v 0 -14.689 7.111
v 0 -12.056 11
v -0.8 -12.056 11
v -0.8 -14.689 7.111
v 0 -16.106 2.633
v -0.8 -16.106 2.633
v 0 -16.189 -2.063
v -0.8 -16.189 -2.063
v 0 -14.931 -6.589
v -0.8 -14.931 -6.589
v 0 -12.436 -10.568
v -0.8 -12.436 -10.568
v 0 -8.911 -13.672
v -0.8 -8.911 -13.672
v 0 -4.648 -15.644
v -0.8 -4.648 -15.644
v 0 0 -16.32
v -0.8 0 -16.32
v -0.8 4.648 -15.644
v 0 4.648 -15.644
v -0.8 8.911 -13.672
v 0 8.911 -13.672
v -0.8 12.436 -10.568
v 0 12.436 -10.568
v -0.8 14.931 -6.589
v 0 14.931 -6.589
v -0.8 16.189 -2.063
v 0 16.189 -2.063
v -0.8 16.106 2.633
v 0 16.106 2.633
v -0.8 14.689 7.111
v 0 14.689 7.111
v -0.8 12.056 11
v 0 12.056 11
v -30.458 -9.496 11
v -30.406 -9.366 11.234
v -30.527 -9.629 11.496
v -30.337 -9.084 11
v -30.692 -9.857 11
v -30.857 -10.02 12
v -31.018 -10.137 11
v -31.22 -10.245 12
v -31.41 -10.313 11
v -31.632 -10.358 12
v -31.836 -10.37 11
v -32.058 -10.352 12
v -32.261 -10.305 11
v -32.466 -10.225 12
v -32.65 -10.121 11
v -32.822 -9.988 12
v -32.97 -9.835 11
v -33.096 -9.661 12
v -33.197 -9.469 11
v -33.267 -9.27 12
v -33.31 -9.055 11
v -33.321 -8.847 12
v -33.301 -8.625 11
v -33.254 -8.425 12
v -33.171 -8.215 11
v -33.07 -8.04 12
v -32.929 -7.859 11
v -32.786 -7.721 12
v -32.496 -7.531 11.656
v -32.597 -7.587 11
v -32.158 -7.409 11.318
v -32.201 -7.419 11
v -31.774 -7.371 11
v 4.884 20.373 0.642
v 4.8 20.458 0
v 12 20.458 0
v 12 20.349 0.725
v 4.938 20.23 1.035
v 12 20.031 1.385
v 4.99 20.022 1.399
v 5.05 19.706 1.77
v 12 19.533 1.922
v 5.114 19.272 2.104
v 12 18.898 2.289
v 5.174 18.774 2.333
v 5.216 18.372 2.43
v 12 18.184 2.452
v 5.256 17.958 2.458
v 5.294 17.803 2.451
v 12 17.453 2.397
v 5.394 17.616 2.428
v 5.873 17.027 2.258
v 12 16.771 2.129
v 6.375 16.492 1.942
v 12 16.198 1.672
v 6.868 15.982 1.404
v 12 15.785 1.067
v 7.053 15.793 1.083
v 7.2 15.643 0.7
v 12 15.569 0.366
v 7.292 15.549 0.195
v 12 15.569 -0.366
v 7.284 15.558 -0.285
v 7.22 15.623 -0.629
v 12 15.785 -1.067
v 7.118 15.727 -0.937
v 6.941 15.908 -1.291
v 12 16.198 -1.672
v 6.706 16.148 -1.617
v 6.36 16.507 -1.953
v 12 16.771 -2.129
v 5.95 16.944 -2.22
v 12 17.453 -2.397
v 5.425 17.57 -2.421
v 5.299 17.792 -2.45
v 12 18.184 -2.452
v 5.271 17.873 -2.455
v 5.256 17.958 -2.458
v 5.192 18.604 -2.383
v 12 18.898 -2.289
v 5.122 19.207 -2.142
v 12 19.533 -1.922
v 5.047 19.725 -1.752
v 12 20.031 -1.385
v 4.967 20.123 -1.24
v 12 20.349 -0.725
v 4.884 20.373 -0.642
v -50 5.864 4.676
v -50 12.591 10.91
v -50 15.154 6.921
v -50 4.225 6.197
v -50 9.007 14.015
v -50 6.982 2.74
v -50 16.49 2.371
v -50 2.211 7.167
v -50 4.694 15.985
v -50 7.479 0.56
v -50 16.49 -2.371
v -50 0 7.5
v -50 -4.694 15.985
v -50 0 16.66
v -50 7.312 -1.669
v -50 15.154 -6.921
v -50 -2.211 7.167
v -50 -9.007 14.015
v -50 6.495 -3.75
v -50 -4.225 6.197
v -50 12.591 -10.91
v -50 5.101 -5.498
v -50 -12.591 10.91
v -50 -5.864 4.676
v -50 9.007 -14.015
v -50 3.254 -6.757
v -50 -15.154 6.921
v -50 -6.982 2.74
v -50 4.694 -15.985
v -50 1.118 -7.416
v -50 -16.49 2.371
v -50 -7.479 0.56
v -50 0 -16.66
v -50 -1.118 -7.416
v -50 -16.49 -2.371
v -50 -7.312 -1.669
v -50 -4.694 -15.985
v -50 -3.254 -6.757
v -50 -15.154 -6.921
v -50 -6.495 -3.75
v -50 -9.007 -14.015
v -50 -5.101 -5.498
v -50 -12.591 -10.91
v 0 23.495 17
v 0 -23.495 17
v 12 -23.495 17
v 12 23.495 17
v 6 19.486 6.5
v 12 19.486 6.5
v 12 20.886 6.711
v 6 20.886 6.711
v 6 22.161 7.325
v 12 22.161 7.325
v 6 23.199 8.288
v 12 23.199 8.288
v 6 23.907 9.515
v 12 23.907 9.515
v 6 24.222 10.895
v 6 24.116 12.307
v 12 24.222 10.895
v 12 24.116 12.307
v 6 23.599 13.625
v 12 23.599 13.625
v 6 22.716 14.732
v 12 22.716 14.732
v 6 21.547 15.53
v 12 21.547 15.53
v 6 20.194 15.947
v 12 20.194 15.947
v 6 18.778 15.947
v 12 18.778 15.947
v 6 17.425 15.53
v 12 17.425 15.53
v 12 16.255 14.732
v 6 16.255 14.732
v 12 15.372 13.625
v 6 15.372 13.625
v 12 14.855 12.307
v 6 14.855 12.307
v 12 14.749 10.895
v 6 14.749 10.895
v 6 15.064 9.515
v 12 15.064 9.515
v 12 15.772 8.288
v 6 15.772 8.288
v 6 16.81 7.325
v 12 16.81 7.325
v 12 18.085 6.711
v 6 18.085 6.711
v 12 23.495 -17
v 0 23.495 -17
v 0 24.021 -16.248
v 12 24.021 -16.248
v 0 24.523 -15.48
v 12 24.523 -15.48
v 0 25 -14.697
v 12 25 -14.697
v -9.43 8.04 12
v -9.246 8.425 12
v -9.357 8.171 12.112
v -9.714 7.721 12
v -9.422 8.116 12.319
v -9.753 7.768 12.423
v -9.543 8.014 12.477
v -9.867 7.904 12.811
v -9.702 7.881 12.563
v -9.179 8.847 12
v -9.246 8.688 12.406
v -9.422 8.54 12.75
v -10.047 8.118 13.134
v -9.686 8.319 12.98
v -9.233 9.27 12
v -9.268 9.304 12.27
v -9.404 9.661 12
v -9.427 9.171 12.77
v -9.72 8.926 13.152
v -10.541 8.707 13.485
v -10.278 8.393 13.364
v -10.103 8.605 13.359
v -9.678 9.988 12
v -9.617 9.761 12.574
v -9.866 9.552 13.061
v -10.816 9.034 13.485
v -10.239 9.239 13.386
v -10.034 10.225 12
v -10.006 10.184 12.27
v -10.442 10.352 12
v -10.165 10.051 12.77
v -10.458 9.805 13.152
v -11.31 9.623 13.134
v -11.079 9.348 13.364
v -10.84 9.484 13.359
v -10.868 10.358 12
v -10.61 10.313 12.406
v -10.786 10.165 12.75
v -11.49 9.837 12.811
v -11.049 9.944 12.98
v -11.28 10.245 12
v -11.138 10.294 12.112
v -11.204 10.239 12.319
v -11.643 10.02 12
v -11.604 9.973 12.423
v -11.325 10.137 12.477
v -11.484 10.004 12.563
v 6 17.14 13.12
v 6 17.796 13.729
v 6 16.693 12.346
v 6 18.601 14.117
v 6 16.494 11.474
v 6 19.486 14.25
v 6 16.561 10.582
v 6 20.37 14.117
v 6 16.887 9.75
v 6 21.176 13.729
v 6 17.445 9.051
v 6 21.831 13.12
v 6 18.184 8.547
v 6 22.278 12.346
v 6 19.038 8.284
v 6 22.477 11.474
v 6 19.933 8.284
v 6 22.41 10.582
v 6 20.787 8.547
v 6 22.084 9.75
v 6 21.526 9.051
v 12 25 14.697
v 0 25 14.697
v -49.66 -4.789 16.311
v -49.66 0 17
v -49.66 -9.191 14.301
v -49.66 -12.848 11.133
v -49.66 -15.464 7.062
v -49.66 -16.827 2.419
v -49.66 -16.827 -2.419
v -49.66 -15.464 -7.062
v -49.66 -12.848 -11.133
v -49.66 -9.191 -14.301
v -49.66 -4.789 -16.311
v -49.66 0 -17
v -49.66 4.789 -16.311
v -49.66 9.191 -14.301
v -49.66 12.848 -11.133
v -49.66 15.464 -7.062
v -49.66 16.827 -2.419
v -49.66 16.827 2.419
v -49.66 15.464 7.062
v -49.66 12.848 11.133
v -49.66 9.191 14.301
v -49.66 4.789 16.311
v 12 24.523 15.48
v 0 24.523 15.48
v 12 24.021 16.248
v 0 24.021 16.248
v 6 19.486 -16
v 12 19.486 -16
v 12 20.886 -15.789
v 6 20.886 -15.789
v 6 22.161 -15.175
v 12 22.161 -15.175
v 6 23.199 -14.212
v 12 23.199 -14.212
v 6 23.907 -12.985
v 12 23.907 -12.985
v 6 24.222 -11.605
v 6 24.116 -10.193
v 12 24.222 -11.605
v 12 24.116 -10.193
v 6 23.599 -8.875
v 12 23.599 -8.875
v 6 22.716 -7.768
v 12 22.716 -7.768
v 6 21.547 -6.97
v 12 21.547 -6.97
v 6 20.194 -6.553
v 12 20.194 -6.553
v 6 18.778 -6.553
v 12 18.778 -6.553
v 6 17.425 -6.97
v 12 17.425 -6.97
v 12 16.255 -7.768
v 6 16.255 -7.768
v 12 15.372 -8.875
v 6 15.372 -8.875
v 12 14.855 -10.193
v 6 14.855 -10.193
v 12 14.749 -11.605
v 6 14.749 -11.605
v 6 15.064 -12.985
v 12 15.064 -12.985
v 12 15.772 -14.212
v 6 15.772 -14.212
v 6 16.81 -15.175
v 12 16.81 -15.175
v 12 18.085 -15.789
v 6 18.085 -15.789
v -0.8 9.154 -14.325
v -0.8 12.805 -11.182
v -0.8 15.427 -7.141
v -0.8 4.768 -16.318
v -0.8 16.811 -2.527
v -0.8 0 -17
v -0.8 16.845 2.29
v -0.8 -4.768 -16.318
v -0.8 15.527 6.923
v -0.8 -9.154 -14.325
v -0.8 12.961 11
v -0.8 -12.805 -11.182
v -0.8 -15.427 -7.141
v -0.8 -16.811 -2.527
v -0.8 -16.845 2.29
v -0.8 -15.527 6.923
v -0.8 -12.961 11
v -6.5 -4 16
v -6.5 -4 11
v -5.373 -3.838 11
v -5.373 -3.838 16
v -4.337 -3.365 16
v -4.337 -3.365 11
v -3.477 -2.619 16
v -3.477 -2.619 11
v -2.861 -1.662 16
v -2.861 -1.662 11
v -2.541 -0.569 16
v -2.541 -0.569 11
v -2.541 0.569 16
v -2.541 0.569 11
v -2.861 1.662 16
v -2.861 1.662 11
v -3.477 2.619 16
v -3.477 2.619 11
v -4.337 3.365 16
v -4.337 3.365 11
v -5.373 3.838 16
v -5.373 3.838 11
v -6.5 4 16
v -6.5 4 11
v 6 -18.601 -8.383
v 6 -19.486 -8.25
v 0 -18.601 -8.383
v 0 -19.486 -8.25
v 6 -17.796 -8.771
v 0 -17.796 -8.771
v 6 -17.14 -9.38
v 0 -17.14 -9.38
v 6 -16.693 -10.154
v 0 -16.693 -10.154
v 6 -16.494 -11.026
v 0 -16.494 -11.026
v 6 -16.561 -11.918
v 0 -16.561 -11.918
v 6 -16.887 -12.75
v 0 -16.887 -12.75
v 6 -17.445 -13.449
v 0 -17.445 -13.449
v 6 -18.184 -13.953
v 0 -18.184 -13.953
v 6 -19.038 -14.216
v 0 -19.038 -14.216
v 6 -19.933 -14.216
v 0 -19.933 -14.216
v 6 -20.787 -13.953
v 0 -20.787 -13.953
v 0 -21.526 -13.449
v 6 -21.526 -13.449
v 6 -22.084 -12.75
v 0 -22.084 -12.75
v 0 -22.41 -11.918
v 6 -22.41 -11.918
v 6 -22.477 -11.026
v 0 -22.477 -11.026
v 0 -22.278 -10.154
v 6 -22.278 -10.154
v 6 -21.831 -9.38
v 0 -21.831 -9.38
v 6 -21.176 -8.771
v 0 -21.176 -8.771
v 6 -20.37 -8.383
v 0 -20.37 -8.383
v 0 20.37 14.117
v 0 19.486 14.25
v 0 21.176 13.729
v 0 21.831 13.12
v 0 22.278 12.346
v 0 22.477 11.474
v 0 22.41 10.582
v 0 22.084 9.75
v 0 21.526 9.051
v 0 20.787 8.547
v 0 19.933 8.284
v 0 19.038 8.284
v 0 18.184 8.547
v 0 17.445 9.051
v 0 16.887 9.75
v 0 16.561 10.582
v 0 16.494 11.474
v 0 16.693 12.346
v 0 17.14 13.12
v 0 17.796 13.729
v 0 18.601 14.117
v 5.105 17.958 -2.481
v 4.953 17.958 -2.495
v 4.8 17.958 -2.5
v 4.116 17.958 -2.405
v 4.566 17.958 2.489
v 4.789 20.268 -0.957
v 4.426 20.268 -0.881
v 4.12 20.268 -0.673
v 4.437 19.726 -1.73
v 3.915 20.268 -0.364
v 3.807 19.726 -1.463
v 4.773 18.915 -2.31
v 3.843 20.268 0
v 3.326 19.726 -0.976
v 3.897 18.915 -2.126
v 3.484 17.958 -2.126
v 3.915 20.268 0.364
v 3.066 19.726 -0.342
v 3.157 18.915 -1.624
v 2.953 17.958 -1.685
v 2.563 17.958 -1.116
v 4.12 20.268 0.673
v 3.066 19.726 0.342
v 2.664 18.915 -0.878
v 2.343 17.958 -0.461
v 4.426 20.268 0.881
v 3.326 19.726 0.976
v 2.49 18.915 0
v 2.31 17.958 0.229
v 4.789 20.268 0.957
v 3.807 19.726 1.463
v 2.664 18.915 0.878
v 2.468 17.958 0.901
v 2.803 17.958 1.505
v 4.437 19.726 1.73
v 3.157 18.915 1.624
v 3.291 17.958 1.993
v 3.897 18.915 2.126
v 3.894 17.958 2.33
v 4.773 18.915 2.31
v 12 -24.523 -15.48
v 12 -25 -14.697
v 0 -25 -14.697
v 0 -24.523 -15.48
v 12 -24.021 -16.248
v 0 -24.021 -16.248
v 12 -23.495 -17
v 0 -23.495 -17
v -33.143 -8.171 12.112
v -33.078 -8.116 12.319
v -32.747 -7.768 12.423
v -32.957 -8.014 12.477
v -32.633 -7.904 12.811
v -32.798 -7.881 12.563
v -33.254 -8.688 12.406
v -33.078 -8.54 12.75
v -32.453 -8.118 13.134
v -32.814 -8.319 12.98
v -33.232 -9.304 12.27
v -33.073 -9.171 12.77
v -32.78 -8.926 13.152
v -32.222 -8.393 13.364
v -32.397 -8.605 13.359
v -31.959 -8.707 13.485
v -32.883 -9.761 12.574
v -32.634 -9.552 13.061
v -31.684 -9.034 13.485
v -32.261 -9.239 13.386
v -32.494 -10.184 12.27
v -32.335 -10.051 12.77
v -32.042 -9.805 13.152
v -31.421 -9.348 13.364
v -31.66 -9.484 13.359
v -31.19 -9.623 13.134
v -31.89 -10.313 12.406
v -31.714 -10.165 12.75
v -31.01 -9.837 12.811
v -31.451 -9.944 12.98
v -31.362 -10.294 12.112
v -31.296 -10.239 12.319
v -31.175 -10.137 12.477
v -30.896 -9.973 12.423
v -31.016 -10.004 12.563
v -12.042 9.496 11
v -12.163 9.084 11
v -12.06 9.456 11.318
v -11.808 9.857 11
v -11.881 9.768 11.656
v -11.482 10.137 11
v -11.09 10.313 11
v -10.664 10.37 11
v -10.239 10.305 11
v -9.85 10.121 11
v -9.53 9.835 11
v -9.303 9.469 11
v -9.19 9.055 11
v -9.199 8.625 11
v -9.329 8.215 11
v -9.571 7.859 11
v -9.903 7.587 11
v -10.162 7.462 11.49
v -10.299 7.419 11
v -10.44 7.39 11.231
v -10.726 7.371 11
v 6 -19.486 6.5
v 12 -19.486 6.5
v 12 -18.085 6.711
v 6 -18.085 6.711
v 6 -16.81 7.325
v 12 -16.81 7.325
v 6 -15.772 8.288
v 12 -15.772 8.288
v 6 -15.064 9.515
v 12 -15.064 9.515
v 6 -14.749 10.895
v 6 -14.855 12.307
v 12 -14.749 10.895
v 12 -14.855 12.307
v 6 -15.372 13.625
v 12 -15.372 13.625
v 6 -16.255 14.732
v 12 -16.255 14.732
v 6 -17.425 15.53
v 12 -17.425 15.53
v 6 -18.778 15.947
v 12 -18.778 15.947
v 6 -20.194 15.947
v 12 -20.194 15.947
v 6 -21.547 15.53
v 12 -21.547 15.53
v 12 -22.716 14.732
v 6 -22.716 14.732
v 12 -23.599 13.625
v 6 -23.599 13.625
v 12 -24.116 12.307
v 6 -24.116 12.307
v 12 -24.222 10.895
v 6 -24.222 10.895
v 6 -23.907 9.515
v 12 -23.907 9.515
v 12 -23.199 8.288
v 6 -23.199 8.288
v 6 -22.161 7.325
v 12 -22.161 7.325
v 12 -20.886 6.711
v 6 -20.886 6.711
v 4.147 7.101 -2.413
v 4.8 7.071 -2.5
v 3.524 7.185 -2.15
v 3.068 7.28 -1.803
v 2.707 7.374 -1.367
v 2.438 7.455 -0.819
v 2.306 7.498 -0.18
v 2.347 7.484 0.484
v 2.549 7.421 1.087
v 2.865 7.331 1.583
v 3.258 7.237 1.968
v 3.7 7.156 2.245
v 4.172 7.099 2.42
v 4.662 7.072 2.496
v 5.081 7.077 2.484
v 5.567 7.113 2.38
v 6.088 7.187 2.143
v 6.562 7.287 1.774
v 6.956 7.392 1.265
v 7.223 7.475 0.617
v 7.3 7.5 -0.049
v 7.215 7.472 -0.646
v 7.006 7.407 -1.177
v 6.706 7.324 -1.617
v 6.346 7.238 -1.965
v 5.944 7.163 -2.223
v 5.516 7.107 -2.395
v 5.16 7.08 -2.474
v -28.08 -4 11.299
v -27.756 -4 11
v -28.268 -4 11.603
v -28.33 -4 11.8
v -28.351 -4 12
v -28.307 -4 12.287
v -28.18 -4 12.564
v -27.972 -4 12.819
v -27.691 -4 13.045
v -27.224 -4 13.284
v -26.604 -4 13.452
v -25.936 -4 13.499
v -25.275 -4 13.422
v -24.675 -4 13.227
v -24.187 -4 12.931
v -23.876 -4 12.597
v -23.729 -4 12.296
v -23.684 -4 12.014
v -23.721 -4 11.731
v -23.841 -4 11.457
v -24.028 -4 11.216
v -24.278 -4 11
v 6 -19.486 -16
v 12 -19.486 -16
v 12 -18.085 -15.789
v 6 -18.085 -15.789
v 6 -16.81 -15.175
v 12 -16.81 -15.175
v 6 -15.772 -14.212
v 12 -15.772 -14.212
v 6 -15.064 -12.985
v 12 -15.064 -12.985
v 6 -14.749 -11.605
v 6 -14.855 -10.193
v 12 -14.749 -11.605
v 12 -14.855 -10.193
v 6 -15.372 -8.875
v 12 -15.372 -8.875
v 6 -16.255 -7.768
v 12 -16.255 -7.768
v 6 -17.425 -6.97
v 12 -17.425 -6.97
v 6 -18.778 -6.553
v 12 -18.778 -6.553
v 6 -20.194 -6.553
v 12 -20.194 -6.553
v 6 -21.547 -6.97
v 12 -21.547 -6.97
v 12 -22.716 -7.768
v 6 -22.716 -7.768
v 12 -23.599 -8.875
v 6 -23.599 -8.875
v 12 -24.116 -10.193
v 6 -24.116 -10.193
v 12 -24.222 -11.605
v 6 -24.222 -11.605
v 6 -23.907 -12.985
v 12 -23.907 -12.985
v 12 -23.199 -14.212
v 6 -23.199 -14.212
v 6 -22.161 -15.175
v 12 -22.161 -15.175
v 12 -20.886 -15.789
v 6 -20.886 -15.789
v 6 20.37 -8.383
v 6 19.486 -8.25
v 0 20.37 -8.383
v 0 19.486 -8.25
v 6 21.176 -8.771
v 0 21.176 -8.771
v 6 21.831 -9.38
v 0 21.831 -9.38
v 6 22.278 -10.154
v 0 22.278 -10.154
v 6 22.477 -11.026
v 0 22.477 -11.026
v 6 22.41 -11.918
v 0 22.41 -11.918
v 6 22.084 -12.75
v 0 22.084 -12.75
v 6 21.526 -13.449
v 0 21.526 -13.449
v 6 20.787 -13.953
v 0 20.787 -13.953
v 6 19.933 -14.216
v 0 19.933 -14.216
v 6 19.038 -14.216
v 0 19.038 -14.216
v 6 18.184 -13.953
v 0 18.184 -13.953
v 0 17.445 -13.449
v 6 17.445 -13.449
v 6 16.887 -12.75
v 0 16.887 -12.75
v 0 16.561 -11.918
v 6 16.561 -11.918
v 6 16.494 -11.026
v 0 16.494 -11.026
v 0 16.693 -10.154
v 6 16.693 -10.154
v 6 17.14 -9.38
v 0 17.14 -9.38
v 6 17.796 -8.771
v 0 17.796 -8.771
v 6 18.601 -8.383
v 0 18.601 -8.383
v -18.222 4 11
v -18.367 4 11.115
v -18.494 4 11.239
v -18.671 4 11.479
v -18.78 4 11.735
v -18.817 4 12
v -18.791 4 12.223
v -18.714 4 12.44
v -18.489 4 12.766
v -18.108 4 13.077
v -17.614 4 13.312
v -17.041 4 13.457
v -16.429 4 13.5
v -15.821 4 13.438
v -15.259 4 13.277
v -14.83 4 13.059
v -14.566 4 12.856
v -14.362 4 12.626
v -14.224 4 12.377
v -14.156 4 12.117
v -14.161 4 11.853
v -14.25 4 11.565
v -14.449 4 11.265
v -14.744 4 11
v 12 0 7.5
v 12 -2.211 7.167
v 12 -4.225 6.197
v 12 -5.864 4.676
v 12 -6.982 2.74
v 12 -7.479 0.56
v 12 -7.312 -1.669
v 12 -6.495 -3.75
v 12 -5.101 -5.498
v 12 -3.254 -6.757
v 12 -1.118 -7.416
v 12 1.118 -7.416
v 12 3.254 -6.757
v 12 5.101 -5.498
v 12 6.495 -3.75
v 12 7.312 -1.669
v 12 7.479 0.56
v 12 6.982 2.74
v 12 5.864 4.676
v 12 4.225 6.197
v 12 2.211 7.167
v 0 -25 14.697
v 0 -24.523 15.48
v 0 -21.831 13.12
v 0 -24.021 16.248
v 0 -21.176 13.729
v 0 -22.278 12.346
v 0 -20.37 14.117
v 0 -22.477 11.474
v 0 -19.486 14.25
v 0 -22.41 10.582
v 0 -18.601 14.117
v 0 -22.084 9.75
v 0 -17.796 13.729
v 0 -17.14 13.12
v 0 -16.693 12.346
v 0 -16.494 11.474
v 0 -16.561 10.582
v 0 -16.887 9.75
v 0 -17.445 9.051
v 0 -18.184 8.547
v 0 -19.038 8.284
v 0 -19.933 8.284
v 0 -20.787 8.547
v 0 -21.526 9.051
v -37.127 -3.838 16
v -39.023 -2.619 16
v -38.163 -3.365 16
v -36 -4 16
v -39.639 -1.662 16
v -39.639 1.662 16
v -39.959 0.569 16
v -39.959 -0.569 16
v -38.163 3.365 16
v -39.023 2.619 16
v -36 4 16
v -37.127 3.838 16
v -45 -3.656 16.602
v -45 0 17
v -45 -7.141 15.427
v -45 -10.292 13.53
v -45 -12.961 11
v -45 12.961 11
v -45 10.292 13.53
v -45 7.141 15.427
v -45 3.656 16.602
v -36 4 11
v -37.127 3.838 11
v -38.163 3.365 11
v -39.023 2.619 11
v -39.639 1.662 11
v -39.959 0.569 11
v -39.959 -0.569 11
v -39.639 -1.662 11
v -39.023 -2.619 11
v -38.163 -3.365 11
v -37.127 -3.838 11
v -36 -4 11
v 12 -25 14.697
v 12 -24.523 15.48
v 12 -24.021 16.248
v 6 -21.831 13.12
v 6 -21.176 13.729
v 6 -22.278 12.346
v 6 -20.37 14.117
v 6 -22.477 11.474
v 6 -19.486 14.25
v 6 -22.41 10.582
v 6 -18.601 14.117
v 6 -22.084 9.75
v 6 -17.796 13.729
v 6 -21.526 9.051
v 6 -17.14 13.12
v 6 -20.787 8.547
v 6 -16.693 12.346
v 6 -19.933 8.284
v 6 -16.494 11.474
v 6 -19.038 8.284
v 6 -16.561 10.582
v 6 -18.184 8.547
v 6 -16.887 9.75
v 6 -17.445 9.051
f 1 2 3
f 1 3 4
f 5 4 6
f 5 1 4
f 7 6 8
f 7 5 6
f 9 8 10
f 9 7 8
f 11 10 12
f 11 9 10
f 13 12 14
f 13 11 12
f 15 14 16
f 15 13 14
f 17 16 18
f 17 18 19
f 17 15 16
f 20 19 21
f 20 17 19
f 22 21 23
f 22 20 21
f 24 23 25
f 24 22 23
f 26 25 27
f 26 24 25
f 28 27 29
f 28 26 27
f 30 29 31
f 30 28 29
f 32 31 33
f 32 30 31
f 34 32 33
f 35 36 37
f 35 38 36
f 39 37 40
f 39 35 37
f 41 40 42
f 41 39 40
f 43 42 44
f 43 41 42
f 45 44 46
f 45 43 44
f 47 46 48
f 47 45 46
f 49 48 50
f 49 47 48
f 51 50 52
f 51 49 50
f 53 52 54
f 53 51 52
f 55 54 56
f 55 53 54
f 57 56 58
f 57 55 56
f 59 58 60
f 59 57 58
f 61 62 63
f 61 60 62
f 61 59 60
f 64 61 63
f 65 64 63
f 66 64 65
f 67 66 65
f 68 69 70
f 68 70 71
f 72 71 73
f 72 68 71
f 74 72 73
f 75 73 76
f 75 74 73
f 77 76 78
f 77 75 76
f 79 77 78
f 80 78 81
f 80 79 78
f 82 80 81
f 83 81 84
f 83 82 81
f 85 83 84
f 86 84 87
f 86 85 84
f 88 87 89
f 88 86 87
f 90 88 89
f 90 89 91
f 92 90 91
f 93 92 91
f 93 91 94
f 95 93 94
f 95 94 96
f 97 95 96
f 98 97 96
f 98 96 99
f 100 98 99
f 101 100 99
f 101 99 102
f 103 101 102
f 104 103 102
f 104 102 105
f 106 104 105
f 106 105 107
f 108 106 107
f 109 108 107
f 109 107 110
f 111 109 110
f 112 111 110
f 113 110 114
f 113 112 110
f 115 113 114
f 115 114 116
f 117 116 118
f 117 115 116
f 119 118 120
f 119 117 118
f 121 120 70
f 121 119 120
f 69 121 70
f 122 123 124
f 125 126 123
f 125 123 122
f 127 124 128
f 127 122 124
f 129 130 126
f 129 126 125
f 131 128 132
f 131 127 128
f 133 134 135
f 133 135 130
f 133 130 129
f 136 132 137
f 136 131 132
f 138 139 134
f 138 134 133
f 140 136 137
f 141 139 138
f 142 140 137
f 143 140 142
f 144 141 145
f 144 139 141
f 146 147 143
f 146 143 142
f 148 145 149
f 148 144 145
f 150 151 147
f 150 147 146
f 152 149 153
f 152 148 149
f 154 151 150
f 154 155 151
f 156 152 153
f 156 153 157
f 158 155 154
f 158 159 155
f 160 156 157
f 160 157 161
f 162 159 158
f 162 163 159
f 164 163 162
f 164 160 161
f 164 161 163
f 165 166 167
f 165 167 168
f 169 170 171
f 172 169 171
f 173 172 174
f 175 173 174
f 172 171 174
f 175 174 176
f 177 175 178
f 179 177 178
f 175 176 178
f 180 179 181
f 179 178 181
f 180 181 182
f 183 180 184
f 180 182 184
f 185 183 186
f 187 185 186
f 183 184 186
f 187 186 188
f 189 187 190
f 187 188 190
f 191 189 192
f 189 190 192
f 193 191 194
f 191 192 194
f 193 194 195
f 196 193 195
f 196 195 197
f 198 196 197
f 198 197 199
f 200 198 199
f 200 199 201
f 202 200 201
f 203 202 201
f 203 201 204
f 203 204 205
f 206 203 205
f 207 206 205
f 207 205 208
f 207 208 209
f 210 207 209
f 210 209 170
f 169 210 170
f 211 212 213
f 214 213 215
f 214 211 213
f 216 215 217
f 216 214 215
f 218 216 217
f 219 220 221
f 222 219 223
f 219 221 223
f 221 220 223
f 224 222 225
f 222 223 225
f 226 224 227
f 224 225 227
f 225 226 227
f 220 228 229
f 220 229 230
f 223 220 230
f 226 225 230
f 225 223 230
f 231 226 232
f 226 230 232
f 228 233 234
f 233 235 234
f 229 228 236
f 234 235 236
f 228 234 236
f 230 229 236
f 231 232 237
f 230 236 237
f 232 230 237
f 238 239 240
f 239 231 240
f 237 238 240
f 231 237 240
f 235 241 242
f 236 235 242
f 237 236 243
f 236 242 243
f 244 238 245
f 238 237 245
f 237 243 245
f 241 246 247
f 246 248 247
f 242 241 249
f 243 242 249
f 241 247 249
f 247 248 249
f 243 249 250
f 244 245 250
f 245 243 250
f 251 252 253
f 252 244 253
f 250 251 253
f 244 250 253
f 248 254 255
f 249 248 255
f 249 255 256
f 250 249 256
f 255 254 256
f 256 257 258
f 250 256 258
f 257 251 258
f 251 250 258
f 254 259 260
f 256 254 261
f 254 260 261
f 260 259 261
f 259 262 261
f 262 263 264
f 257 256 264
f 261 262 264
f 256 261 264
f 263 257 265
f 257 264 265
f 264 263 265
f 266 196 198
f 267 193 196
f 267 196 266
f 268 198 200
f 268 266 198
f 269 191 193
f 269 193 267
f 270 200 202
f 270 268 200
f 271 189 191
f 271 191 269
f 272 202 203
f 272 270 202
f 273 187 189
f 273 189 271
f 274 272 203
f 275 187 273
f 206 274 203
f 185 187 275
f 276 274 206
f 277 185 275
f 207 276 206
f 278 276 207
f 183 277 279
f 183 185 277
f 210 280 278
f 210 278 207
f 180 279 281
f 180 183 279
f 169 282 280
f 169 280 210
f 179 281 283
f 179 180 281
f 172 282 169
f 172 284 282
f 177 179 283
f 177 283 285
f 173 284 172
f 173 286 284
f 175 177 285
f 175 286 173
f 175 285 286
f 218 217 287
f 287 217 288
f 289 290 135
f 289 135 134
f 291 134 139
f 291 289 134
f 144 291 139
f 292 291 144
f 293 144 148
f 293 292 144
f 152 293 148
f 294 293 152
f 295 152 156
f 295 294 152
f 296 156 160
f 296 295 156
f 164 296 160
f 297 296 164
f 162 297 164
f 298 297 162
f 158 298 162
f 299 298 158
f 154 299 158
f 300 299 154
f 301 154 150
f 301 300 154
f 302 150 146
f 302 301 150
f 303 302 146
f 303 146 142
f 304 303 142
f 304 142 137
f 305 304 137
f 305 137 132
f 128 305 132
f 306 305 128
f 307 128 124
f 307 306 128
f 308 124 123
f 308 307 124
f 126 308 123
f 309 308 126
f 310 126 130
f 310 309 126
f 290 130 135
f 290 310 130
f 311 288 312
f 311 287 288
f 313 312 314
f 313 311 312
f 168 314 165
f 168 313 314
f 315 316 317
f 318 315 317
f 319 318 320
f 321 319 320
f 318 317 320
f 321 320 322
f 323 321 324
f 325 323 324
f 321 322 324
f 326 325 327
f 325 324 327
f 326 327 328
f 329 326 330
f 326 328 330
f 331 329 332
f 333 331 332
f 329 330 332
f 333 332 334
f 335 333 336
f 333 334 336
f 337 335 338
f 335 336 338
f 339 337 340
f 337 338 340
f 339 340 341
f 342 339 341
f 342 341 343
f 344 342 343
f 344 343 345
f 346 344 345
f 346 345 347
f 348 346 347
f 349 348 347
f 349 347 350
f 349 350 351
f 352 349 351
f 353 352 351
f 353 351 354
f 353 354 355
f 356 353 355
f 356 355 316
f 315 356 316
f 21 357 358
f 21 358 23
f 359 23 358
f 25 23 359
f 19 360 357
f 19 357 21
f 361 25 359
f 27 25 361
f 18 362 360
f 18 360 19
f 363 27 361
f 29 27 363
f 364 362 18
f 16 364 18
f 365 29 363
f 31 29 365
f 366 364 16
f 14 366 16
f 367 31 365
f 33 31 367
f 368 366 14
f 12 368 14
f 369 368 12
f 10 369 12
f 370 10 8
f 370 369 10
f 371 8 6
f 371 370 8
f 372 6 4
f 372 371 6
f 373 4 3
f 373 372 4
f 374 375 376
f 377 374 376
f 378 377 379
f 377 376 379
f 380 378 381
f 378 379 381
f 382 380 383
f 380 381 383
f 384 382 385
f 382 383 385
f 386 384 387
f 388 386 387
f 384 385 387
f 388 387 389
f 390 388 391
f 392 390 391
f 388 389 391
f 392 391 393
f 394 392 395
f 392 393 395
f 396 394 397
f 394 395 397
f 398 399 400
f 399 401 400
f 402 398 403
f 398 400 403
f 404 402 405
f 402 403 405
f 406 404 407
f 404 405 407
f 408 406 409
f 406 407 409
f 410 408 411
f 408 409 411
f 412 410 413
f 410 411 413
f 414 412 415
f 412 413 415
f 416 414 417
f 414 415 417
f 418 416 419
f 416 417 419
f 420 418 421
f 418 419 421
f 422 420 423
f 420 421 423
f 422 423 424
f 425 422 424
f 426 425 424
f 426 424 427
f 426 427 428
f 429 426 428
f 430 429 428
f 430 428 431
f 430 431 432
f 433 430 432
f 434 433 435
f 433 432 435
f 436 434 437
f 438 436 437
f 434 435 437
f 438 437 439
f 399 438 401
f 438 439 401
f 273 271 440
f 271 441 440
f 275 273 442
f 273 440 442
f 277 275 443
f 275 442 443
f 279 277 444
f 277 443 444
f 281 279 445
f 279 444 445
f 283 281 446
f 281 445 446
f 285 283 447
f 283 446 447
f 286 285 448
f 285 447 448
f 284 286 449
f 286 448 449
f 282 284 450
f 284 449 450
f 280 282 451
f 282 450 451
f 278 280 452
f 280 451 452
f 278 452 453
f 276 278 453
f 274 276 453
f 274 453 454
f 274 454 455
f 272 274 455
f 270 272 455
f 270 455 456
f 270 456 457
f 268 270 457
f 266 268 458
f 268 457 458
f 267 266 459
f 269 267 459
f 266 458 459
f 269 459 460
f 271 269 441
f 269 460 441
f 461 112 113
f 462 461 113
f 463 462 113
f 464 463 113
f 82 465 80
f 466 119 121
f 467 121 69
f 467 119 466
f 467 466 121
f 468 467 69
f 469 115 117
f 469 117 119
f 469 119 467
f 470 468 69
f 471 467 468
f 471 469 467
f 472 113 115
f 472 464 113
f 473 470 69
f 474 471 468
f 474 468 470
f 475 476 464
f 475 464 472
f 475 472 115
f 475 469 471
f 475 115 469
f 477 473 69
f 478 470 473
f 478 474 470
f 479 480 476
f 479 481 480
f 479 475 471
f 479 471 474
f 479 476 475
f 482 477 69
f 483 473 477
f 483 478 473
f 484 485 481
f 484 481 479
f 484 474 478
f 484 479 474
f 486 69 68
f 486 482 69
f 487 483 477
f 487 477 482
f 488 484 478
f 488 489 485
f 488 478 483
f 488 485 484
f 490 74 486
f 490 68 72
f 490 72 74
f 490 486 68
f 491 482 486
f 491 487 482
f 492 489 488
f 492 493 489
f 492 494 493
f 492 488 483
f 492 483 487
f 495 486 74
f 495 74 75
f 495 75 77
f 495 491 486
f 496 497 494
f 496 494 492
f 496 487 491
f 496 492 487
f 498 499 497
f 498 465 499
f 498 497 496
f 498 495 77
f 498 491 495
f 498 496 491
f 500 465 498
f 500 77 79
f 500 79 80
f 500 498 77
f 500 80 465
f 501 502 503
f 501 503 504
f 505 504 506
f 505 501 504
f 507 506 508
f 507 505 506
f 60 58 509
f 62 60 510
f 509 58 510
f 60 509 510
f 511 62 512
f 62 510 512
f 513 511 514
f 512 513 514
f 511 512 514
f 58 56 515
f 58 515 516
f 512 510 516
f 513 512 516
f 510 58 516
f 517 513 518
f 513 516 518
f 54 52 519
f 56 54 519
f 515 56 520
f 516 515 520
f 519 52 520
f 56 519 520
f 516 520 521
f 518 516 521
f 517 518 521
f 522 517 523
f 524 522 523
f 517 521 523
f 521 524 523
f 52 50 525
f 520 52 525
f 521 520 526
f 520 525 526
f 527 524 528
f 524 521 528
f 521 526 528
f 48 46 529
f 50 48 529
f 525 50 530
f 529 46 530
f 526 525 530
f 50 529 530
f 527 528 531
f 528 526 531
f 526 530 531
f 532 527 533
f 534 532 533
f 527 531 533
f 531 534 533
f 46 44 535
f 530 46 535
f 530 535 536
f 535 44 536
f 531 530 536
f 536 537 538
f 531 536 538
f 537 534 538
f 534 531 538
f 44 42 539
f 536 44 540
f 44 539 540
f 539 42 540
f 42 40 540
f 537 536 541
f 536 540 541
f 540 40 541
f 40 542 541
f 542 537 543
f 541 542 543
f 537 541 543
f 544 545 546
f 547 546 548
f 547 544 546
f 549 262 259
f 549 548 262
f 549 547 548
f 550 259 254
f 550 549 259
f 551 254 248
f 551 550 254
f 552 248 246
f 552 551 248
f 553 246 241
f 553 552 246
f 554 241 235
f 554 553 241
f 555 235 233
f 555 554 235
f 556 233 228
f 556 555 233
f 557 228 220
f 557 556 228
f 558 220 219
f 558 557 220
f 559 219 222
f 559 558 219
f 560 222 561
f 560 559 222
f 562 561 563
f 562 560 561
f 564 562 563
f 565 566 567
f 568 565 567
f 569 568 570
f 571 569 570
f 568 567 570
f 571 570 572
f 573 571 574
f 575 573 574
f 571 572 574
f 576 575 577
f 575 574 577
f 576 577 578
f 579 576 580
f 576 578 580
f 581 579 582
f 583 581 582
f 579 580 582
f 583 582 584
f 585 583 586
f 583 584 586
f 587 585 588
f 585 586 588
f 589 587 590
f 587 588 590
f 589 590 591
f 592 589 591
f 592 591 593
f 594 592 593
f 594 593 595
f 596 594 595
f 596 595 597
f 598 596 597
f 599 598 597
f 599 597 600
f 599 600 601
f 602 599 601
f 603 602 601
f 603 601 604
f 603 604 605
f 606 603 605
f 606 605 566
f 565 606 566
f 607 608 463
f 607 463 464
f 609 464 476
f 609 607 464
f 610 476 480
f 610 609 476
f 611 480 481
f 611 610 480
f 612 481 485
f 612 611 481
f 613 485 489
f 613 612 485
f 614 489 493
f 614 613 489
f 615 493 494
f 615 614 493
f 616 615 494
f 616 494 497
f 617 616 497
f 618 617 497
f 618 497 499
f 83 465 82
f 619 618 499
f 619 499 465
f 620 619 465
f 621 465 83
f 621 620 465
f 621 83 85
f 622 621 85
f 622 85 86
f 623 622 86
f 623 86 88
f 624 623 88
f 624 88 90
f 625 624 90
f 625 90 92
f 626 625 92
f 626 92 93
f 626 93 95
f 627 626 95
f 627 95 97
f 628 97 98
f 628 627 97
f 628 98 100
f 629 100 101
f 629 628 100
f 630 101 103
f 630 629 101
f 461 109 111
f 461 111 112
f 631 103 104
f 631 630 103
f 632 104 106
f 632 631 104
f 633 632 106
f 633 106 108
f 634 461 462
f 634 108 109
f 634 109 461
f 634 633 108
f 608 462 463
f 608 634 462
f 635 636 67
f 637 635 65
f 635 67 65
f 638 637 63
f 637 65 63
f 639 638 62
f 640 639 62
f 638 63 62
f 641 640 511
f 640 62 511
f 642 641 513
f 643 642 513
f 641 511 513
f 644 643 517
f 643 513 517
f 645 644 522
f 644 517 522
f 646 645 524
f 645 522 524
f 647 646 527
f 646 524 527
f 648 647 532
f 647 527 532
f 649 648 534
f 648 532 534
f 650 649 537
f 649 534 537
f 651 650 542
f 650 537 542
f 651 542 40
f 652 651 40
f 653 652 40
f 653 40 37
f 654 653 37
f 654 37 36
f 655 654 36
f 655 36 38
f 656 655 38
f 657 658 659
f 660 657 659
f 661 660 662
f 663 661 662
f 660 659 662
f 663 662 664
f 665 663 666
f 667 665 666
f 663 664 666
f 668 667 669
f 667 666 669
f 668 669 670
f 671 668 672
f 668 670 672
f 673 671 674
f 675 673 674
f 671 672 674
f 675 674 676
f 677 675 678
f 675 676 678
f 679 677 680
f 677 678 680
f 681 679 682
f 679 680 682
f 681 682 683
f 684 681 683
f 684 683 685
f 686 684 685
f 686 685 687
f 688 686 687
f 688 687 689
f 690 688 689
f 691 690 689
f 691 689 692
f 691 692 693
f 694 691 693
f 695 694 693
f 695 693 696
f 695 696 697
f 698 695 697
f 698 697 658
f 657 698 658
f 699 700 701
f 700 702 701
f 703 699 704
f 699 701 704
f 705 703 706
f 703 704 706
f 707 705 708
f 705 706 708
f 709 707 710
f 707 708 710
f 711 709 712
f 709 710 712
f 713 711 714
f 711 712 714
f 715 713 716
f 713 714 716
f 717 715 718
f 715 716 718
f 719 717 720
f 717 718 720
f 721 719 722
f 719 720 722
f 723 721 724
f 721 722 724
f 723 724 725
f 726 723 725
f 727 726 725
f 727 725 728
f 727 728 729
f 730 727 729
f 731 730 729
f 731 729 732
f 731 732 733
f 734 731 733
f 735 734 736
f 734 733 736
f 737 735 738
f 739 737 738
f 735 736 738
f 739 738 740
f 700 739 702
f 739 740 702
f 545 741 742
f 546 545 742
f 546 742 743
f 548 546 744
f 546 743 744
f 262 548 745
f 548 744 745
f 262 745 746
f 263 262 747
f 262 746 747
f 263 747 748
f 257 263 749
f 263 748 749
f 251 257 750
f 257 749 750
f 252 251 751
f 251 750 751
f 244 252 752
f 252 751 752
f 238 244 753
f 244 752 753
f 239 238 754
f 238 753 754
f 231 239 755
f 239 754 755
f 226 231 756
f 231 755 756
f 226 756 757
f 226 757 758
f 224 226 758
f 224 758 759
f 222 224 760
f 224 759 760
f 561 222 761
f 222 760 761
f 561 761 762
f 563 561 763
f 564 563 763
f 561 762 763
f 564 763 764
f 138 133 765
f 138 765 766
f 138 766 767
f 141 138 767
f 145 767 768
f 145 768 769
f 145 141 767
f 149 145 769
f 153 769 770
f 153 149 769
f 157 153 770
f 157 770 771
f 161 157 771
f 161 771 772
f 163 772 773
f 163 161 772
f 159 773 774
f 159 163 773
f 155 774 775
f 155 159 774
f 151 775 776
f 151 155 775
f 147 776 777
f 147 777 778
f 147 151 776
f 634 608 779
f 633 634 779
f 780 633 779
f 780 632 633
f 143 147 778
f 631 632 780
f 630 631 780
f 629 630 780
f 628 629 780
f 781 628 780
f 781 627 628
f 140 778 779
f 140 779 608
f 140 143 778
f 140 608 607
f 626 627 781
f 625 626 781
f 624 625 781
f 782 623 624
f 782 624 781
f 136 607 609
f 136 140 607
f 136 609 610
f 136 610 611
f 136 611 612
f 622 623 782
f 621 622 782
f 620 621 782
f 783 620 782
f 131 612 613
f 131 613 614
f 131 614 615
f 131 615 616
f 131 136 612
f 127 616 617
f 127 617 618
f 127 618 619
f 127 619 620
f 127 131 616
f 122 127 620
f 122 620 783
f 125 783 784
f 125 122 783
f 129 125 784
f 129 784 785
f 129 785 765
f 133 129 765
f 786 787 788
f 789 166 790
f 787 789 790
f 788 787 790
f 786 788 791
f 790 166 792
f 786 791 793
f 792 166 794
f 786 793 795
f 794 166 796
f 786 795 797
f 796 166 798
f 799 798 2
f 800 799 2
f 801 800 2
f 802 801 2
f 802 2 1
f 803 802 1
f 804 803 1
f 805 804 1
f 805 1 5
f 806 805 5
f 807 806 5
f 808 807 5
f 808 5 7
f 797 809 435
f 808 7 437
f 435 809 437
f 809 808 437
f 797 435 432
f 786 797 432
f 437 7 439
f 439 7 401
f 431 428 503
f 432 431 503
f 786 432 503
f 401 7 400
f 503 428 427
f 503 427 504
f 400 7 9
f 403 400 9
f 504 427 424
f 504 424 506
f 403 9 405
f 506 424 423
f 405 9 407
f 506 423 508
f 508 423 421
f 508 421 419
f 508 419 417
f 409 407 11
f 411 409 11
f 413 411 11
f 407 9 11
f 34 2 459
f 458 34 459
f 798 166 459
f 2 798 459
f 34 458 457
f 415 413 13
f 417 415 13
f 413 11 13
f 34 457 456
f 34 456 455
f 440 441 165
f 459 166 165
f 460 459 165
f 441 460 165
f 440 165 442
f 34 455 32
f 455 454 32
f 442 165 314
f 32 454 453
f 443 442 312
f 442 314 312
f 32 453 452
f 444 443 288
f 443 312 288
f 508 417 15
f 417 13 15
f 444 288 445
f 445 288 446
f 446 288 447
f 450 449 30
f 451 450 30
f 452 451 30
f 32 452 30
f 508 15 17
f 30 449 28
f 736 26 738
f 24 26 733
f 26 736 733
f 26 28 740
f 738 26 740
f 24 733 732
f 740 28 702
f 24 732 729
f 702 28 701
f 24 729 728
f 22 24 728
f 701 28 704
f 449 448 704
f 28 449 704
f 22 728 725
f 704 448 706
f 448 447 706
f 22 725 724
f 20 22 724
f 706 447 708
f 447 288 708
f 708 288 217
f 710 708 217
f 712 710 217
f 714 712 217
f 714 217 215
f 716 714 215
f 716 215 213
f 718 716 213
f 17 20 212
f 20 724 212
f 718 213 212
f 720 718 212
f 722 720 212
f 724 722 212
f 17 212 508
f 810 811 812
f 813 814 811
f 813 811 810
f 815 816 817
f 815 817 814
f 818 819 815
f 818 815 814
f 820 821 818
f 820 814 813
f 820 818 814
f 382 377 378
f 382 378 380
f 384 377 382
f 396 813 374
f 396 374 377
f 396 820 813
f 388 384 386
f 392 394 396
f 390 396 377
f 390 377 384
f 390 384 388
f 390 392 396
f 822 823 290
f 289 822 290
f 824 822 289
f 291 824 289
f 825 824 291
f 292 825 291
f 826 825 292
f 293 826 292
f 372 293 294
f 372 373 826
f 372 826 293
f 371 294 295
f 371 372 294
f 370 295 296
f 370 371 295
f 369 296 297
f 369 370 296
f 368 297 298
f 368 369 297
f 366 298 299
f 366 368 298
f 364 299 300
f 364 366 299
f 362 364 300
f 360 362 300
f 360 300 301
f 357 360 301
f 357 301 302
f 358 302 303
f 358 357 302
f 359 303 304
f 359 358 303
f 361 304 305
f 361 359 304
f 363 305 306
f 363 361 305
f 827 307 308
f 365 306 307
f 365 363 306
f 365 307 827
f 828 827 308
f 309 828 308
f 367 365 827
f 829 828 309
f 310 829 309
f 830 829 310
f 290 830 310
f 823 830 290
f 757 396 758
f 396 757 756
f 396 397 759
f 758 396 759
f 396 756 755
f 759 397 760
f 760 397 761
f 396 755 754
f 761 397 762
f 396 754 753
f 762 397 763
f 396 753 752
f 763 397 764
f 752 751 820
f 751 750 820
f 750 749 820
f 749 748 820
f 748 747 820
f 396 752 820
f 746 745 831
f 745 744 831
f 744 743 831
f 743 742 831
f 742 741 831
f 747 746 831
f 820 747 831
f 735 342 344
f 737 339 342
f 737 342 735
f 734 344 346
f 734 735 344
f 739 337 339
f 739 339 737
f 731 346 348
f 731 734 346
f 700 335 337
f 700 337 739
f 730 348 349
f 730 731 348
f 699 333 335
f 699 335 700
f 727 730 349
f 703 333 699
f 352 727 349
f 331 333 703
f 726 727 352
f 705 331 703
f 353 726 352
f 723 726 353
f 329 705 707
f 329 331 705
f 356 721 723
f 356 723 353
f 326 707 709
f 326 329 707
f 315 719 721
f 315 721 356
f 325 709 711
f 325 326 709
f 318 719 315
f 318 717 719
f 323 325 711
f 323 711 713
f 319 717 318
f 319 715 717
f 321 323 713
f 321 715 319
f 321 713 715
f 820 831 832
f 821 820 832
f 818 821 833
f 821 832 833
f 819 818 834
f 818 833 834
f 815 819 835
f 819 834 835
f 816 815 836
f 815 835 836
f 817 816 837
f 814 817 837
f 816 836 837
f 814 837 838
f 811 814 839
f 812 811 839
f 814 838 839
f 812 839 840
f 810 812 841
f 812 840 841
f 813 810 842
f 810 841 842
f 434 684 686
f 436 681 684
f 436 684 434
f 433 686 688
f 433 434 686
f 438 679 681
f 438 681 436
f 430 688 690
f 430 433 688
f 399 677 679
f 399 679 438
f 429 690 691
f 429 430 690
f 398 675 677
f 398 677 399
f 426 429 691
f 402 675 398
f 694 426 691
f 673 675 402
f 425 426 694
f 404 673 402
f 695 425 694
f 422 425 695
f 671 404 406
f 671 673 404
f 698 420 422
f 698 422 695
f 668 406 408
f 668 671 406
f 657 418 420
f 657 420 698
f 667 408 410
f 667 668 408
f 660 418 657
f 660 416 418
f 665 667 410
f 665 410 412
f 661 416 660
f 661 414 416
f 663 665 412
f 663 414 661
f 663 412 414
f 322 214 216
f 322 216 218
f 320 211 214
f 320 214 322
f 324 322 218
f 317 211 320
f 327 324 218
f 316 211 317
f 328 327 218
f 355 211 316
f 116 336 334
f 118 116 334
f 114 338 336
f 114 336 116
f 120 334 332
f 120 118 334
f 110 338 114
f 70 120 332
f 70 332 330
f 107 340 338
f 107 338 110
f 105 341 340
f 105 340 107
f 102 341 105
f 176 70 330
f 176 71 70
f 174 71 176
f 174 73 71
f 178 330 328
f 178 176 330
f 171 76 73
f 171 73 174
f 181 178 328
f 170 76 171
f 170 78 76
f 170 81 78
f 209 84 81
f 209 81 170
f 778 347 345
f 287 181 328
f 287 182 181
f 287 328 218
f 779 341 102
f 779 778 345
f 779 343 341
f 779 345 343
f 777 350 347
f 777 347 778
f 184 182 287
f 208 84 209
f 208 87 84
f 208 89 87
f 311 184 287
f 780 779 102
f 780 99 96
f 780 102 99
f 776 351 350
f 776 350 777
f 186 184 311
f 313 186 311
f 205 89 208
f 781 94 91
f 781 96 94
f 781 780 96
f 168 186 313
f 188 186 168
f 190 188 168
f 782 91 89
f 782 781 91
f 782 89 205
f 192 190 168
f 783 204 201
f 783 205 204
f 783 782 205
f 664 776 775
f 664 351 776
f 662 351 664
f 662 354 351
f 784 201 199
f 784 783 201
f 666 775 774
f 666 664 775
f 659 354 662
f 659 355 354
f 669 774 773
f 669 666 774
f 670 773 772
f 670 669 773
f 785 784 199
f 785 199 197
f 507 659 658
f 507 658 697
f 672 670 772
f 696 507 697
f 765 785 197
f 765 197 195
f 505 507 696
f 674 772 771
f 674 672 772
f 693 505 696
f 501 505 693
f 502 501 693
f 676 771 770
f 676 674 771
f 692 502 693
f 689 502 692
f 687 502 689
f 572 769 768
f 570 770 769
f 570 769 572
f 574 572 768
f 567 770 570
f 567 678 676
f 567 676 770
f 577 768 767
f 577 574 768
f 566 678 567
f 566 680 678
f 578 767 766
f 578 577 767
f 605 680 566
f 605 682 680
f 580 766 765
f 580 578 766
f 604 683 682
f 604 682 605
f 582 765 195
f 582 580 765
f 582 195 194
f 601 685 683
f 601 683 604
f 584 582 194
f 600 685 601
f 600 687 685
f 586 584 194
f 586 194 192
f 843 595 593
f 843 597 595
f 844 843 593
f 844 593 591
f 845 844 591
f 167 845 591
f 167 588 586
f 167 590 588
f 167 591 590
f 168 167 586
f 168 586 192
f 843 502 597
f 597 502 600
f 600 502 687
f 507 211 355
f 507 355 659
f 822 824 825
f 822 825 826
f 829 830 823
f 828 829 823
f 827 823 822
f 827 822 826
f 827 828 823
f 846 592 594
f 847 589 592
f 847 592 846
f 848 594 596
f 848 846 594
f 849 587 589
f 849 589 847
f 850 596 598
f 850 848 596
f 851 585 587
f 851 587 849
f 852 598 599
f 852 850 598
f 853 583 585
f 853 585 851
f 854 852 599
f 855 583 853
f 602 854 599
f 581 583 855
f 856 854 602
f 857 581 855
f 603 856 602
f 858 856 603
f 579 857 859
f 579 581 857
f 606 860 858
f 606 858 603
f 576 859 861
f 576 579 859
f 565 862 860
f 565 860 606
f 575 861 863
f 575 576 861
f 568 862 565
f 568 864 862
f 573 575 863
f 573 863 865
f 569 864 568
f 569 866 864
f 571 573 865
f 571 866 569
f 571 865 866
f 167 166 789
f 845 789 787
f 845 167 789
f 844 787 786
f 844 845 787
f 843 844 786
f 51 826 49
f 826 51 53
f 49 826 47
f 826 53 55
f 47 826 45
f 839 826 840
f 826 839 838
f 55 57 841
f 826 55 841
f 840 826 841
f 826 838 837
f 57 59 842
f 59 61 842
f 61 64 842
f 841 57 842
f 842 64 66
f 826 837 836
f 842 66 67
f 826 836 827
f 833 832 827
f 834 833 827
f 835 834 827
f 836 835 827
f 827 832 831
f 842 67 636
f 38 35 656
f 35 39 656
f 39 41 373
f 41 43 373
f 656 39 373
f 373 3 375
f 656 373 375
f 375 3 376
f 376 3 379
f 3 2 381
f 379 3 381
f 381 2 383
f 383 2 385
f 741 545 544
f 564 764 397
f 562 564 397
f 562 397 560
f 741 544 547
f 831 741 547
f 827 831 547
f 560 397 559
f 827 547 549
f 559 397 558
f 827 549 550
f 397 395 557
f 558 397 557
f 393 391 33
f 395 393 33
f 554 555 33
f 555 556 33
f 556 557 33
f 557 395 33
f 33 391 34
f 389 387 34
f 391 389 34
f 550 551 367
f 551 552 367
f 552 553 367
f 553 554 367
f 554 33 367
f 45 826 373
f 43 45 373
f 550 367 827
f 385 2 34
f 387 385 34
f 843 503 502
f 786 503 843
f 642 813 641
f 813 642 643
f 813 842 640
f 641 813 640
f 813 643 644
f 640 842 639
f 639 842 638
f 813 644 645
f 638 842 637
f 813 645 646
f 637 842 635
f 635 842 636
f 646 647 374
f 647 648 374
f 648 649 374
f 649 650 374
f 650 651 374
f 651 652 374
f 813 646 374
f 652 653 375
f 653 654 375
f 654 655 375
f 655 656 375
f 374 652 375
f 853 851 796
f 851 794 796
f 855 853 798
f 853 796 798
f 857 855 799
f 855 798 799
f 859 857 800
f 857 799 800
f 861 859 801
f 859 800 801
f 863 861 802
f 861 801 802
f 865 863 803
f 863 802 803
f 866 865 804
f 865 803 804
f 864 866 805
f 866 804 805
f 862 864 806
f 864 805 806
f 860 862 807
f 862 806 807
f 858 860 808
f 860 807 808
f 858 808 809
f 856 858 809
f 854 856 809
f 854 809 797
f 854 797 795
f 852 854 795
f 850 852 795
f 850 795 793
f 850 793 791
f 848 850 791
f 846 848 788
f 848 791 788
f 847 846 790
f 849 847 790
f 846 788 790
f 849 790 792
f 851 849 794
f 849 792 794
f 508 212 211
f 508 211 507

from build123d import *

# Parameters (mm, degrees)
CUT_EXTRUDE1_DEPTH                 = 65.668384857
CHAMFER1_SIZE                      = 0.34
SOCKET_HEAD_CAP_SCREW1_D           = 6
SOCKET_HEAD_CAP_SCREW1_CBORE_D     = 9.5
SOCKET_HEAD_CAP_SCREW1_CBORE_DEPTH = 6
CUT_EXTRUDE2_DEPTH                 = 45
BOSS_EXTRUDE1_DEPTH                = 5
SKETCH7_R                          = 1.5
BOSS_EXTRUDE2_DEPTH                = 1
REVOLVE3_ANGLE                     = 90
REVOLVE4_ANGLE                     = 90
TAP1_START                         = 4.7999999
TAP1_OUTLINE_R                     = 2.4585
TAP1_DEPTH                         = 7.2000001


# Read off the part's stored shape, not the designer's step: Tap1
with BuildPart() as part:
    # Sketch1 → Revolve1 (revolve)
    with BuildSketch(Plane.XY, mode=Mode.PRIVATE) as revolve1_sk:
        Polygon((0, 29), (12, 29), (12, 7.5), (-50, 7.5), (-50, 17), (-0.8, 17), (-0.8, 16.32), (0, 16.32), align=None)
    revolve(revolve1_sk.sketch.rotate(Axis((-50, 0, 0), (1, 0, 0)), 90), axis=Axis((-50, 0, 0), (1, 0, 0)))

    # Sketch2 → Cut-Extrude1 (cut, through all)
    with BuildSketch(Plane(origin=(0, 0, 0), x_dir=(0, 0, -1), z_dir=(1, 0, 0))):
        with BuildLine():
            Line((14.696938457, 25), (-14.696938457, 25))
            ThreePointArc((-14.696938457, 25), (0, 29), (14.696938457, 25))
        make_face()
        with BuildLine():
            Line((17, 23.494680249), (17, -23.494680249))
            ThreePointArc((17, -23.494680249), (29, 0), (17, 23.494680249))
        make_face()
        with BuildLine():
            Line((14.696938457, -25), (-14.696938457, -25))
            ThreePointArc((-14.696938457, -25), (0, -29), (14.696938457, -25))
        make_face()
        with BuildLine():
            Line((-17, -23.494680249), (-17, 23.494680249))
            ThreePointArc((-17, 23.494680249), (-29, 0), (-17, -23.494680249))
        make_face()
    extrude(amount=CUT_EXTRUDE1_DEPTH, mode=Mode.SUBTRACT)

    # Chamfer1
    chamfer1_edges = [part.edges().sort_by_distance(p)[0] for p in [
        (-50, 0, -17),
    ]]
    chamfer(chamfer1_edges, length=CHAMFER1_SIZE)

    # Socket Head Cap Screw1 (through all)
    with Locations(Plane(origin=(12, 0, 0), x_dir=(0, 0, -1), z_dir=(1, 0, 0))):
        with Locations((-11.25, 19.485571585), (11.25, -19.485571585), (-11.25, -19.485571585), (11.25, 19.485571585)):
            CounterBoreHole(SOCKET_HEAD_CAP_SCREW1_D / 2, SOCKET_HEAD_CAP_SCREW1_CBORE_D / 2, SOCKET_HEAD_CAP_SCREW1_CBORE_DEPTH)

    # Sketch5 → Cut-Extrude2 (cut)
    with BuildSketch(Plane(origin=(0, 0, 0), x_dir=(0, 0, -1), z_dir=(1, 0, 0))):
        with BuildLine():
            Line((-11, -12.961481397), (-11, 12.961481397))
            ThreePointArc((-11, 12.961481397), (-17, 0), (-11, -12.961481397))
        make_face()
    extrude(amount=-CUT_EXTRUDE2_DEPTH, mode=Mode.SUBTRACT)

    # Sketch6 → Boss-Extrude1 (add)
    with BuildSketch(Plane(origin=(0, 0, 11), x_dir=(-1, 0, 0), z_dir=(0, 0, -1))):
        with BuildLine():
            Line((6.5, 4), (36, 4))
            ThreePointArc((36, 4), (40, 0), (36, -4))
            Line((36, -4), (6.5, -4))
            ThreePointArc((6.5, -4), (2.5, 0), (6.5, 4))
        make_face()
    extrude(amount=-BOSS_EXTRUDE1_DEPTH)

    # Sketch7 → Boss-Extrude2 (add)
    with BuildSketch(Plane(origin=(0, 0, 11), x_dir=(-1, 0, 0), z_dir=(0, 0, -1))):
        with Locations(Location((31.821413315, -8.870469014, 0), (0, 0, 180))):
            Circle(SKETCH7_R)
        with Locations(Location((10.678586685, 8.870469014, 0), (0, 0, 180))):
            Circle(SKETCH7_R)
    extrude(amount=-BOSS_EXTRUDE2_DEPTH)

    # Sketch8 → Revolve2 (revolve)
    with BuildSketch(Plane.XY.offset(12)):
        Polygon((-31.821413315, -8.870469014), (-10.678586685, 8.870469014), (-11.642768099, 10.019535678), (-32.78559473, -7.721402349), align=None)
    revolve(axis=Axis((-31.821413315, -8.870469014, 12), (0.7660444431189781, 0.6427876096865394, 0)))

    # Sketch9 → Revolve3 (revolve)
    with BuildSketch(Plane.XY.offset(12)):
        with BuildLine():
            Line((-30.857231901, -10.019535678), (-32.78559473, -7.721402349))
            ThreePointArc((-32.78559473, -7.721402349), (-32.97047998, -9.834650428), (-30.857231901, -10.019535678))
        make_face()
    revolve(axis=Axis((-30.857231901, -10.019535678, 12), (-0.6427876096865415, 0.7660444431189763, 0)), revolution_arc=REVOLVE3_ANGLE)

    # Sketch10 → Revolve4 (revolve)
    with BuildSketch(Plane.XY.offset(12)):
        with BuildLine():
            Line((-11.642768099, 10.019535678), (-9.71440527, 7.721402349))
            ThreePointArc((-9.71440527, 7.721402349), (-9.52952002, 9.834650428), (-11.642768099, 10.019535678))
        make_face()
    revolve(axis=Axis((-11.642768099, 10.019535678, 12), (0.6427876096865339, -0.7660444431189826, 0)), revolution_arc=REVOLVE4_ANGLE)

    # Sketch11 → Cut-Revolve1 (revolve, cut)
    with BuildSketch(Plane.XY, mode=Mode.PRIVATE) as cut_revolve1_sk:
        with BuildLine():
            Line((2.3, 0), (4.8, 0))
            Line((4.8, 0), (4.8, 20.4585))
            ThreePointArc((4.8, 20.4585), (3.032233047, 19.726266953), (2.3, 17.9585))
            Line((2.3, 17.9585), (2.3, 0))
        make_face()
    revolve(cut_revolve1_sk.sketch.rotate(Axis((4.8, 0, 0), (0, 1, 0)), 270), axis=Axis((4.8, 0, 0), (0, 1, 0)), mode=Mode.SUBTRACT)

    # Tap1 outline → Tap1 (cut)
    with BuildSketch(Plane.YZ.offset(TAP1_START)):
        with Locations((18, 0)):
            Circle(TAP1_OUTLINE_R)
    extrude(amount=TAP1_DEPTH, mode=Mode.SUBTRACT)


solid = part.part
